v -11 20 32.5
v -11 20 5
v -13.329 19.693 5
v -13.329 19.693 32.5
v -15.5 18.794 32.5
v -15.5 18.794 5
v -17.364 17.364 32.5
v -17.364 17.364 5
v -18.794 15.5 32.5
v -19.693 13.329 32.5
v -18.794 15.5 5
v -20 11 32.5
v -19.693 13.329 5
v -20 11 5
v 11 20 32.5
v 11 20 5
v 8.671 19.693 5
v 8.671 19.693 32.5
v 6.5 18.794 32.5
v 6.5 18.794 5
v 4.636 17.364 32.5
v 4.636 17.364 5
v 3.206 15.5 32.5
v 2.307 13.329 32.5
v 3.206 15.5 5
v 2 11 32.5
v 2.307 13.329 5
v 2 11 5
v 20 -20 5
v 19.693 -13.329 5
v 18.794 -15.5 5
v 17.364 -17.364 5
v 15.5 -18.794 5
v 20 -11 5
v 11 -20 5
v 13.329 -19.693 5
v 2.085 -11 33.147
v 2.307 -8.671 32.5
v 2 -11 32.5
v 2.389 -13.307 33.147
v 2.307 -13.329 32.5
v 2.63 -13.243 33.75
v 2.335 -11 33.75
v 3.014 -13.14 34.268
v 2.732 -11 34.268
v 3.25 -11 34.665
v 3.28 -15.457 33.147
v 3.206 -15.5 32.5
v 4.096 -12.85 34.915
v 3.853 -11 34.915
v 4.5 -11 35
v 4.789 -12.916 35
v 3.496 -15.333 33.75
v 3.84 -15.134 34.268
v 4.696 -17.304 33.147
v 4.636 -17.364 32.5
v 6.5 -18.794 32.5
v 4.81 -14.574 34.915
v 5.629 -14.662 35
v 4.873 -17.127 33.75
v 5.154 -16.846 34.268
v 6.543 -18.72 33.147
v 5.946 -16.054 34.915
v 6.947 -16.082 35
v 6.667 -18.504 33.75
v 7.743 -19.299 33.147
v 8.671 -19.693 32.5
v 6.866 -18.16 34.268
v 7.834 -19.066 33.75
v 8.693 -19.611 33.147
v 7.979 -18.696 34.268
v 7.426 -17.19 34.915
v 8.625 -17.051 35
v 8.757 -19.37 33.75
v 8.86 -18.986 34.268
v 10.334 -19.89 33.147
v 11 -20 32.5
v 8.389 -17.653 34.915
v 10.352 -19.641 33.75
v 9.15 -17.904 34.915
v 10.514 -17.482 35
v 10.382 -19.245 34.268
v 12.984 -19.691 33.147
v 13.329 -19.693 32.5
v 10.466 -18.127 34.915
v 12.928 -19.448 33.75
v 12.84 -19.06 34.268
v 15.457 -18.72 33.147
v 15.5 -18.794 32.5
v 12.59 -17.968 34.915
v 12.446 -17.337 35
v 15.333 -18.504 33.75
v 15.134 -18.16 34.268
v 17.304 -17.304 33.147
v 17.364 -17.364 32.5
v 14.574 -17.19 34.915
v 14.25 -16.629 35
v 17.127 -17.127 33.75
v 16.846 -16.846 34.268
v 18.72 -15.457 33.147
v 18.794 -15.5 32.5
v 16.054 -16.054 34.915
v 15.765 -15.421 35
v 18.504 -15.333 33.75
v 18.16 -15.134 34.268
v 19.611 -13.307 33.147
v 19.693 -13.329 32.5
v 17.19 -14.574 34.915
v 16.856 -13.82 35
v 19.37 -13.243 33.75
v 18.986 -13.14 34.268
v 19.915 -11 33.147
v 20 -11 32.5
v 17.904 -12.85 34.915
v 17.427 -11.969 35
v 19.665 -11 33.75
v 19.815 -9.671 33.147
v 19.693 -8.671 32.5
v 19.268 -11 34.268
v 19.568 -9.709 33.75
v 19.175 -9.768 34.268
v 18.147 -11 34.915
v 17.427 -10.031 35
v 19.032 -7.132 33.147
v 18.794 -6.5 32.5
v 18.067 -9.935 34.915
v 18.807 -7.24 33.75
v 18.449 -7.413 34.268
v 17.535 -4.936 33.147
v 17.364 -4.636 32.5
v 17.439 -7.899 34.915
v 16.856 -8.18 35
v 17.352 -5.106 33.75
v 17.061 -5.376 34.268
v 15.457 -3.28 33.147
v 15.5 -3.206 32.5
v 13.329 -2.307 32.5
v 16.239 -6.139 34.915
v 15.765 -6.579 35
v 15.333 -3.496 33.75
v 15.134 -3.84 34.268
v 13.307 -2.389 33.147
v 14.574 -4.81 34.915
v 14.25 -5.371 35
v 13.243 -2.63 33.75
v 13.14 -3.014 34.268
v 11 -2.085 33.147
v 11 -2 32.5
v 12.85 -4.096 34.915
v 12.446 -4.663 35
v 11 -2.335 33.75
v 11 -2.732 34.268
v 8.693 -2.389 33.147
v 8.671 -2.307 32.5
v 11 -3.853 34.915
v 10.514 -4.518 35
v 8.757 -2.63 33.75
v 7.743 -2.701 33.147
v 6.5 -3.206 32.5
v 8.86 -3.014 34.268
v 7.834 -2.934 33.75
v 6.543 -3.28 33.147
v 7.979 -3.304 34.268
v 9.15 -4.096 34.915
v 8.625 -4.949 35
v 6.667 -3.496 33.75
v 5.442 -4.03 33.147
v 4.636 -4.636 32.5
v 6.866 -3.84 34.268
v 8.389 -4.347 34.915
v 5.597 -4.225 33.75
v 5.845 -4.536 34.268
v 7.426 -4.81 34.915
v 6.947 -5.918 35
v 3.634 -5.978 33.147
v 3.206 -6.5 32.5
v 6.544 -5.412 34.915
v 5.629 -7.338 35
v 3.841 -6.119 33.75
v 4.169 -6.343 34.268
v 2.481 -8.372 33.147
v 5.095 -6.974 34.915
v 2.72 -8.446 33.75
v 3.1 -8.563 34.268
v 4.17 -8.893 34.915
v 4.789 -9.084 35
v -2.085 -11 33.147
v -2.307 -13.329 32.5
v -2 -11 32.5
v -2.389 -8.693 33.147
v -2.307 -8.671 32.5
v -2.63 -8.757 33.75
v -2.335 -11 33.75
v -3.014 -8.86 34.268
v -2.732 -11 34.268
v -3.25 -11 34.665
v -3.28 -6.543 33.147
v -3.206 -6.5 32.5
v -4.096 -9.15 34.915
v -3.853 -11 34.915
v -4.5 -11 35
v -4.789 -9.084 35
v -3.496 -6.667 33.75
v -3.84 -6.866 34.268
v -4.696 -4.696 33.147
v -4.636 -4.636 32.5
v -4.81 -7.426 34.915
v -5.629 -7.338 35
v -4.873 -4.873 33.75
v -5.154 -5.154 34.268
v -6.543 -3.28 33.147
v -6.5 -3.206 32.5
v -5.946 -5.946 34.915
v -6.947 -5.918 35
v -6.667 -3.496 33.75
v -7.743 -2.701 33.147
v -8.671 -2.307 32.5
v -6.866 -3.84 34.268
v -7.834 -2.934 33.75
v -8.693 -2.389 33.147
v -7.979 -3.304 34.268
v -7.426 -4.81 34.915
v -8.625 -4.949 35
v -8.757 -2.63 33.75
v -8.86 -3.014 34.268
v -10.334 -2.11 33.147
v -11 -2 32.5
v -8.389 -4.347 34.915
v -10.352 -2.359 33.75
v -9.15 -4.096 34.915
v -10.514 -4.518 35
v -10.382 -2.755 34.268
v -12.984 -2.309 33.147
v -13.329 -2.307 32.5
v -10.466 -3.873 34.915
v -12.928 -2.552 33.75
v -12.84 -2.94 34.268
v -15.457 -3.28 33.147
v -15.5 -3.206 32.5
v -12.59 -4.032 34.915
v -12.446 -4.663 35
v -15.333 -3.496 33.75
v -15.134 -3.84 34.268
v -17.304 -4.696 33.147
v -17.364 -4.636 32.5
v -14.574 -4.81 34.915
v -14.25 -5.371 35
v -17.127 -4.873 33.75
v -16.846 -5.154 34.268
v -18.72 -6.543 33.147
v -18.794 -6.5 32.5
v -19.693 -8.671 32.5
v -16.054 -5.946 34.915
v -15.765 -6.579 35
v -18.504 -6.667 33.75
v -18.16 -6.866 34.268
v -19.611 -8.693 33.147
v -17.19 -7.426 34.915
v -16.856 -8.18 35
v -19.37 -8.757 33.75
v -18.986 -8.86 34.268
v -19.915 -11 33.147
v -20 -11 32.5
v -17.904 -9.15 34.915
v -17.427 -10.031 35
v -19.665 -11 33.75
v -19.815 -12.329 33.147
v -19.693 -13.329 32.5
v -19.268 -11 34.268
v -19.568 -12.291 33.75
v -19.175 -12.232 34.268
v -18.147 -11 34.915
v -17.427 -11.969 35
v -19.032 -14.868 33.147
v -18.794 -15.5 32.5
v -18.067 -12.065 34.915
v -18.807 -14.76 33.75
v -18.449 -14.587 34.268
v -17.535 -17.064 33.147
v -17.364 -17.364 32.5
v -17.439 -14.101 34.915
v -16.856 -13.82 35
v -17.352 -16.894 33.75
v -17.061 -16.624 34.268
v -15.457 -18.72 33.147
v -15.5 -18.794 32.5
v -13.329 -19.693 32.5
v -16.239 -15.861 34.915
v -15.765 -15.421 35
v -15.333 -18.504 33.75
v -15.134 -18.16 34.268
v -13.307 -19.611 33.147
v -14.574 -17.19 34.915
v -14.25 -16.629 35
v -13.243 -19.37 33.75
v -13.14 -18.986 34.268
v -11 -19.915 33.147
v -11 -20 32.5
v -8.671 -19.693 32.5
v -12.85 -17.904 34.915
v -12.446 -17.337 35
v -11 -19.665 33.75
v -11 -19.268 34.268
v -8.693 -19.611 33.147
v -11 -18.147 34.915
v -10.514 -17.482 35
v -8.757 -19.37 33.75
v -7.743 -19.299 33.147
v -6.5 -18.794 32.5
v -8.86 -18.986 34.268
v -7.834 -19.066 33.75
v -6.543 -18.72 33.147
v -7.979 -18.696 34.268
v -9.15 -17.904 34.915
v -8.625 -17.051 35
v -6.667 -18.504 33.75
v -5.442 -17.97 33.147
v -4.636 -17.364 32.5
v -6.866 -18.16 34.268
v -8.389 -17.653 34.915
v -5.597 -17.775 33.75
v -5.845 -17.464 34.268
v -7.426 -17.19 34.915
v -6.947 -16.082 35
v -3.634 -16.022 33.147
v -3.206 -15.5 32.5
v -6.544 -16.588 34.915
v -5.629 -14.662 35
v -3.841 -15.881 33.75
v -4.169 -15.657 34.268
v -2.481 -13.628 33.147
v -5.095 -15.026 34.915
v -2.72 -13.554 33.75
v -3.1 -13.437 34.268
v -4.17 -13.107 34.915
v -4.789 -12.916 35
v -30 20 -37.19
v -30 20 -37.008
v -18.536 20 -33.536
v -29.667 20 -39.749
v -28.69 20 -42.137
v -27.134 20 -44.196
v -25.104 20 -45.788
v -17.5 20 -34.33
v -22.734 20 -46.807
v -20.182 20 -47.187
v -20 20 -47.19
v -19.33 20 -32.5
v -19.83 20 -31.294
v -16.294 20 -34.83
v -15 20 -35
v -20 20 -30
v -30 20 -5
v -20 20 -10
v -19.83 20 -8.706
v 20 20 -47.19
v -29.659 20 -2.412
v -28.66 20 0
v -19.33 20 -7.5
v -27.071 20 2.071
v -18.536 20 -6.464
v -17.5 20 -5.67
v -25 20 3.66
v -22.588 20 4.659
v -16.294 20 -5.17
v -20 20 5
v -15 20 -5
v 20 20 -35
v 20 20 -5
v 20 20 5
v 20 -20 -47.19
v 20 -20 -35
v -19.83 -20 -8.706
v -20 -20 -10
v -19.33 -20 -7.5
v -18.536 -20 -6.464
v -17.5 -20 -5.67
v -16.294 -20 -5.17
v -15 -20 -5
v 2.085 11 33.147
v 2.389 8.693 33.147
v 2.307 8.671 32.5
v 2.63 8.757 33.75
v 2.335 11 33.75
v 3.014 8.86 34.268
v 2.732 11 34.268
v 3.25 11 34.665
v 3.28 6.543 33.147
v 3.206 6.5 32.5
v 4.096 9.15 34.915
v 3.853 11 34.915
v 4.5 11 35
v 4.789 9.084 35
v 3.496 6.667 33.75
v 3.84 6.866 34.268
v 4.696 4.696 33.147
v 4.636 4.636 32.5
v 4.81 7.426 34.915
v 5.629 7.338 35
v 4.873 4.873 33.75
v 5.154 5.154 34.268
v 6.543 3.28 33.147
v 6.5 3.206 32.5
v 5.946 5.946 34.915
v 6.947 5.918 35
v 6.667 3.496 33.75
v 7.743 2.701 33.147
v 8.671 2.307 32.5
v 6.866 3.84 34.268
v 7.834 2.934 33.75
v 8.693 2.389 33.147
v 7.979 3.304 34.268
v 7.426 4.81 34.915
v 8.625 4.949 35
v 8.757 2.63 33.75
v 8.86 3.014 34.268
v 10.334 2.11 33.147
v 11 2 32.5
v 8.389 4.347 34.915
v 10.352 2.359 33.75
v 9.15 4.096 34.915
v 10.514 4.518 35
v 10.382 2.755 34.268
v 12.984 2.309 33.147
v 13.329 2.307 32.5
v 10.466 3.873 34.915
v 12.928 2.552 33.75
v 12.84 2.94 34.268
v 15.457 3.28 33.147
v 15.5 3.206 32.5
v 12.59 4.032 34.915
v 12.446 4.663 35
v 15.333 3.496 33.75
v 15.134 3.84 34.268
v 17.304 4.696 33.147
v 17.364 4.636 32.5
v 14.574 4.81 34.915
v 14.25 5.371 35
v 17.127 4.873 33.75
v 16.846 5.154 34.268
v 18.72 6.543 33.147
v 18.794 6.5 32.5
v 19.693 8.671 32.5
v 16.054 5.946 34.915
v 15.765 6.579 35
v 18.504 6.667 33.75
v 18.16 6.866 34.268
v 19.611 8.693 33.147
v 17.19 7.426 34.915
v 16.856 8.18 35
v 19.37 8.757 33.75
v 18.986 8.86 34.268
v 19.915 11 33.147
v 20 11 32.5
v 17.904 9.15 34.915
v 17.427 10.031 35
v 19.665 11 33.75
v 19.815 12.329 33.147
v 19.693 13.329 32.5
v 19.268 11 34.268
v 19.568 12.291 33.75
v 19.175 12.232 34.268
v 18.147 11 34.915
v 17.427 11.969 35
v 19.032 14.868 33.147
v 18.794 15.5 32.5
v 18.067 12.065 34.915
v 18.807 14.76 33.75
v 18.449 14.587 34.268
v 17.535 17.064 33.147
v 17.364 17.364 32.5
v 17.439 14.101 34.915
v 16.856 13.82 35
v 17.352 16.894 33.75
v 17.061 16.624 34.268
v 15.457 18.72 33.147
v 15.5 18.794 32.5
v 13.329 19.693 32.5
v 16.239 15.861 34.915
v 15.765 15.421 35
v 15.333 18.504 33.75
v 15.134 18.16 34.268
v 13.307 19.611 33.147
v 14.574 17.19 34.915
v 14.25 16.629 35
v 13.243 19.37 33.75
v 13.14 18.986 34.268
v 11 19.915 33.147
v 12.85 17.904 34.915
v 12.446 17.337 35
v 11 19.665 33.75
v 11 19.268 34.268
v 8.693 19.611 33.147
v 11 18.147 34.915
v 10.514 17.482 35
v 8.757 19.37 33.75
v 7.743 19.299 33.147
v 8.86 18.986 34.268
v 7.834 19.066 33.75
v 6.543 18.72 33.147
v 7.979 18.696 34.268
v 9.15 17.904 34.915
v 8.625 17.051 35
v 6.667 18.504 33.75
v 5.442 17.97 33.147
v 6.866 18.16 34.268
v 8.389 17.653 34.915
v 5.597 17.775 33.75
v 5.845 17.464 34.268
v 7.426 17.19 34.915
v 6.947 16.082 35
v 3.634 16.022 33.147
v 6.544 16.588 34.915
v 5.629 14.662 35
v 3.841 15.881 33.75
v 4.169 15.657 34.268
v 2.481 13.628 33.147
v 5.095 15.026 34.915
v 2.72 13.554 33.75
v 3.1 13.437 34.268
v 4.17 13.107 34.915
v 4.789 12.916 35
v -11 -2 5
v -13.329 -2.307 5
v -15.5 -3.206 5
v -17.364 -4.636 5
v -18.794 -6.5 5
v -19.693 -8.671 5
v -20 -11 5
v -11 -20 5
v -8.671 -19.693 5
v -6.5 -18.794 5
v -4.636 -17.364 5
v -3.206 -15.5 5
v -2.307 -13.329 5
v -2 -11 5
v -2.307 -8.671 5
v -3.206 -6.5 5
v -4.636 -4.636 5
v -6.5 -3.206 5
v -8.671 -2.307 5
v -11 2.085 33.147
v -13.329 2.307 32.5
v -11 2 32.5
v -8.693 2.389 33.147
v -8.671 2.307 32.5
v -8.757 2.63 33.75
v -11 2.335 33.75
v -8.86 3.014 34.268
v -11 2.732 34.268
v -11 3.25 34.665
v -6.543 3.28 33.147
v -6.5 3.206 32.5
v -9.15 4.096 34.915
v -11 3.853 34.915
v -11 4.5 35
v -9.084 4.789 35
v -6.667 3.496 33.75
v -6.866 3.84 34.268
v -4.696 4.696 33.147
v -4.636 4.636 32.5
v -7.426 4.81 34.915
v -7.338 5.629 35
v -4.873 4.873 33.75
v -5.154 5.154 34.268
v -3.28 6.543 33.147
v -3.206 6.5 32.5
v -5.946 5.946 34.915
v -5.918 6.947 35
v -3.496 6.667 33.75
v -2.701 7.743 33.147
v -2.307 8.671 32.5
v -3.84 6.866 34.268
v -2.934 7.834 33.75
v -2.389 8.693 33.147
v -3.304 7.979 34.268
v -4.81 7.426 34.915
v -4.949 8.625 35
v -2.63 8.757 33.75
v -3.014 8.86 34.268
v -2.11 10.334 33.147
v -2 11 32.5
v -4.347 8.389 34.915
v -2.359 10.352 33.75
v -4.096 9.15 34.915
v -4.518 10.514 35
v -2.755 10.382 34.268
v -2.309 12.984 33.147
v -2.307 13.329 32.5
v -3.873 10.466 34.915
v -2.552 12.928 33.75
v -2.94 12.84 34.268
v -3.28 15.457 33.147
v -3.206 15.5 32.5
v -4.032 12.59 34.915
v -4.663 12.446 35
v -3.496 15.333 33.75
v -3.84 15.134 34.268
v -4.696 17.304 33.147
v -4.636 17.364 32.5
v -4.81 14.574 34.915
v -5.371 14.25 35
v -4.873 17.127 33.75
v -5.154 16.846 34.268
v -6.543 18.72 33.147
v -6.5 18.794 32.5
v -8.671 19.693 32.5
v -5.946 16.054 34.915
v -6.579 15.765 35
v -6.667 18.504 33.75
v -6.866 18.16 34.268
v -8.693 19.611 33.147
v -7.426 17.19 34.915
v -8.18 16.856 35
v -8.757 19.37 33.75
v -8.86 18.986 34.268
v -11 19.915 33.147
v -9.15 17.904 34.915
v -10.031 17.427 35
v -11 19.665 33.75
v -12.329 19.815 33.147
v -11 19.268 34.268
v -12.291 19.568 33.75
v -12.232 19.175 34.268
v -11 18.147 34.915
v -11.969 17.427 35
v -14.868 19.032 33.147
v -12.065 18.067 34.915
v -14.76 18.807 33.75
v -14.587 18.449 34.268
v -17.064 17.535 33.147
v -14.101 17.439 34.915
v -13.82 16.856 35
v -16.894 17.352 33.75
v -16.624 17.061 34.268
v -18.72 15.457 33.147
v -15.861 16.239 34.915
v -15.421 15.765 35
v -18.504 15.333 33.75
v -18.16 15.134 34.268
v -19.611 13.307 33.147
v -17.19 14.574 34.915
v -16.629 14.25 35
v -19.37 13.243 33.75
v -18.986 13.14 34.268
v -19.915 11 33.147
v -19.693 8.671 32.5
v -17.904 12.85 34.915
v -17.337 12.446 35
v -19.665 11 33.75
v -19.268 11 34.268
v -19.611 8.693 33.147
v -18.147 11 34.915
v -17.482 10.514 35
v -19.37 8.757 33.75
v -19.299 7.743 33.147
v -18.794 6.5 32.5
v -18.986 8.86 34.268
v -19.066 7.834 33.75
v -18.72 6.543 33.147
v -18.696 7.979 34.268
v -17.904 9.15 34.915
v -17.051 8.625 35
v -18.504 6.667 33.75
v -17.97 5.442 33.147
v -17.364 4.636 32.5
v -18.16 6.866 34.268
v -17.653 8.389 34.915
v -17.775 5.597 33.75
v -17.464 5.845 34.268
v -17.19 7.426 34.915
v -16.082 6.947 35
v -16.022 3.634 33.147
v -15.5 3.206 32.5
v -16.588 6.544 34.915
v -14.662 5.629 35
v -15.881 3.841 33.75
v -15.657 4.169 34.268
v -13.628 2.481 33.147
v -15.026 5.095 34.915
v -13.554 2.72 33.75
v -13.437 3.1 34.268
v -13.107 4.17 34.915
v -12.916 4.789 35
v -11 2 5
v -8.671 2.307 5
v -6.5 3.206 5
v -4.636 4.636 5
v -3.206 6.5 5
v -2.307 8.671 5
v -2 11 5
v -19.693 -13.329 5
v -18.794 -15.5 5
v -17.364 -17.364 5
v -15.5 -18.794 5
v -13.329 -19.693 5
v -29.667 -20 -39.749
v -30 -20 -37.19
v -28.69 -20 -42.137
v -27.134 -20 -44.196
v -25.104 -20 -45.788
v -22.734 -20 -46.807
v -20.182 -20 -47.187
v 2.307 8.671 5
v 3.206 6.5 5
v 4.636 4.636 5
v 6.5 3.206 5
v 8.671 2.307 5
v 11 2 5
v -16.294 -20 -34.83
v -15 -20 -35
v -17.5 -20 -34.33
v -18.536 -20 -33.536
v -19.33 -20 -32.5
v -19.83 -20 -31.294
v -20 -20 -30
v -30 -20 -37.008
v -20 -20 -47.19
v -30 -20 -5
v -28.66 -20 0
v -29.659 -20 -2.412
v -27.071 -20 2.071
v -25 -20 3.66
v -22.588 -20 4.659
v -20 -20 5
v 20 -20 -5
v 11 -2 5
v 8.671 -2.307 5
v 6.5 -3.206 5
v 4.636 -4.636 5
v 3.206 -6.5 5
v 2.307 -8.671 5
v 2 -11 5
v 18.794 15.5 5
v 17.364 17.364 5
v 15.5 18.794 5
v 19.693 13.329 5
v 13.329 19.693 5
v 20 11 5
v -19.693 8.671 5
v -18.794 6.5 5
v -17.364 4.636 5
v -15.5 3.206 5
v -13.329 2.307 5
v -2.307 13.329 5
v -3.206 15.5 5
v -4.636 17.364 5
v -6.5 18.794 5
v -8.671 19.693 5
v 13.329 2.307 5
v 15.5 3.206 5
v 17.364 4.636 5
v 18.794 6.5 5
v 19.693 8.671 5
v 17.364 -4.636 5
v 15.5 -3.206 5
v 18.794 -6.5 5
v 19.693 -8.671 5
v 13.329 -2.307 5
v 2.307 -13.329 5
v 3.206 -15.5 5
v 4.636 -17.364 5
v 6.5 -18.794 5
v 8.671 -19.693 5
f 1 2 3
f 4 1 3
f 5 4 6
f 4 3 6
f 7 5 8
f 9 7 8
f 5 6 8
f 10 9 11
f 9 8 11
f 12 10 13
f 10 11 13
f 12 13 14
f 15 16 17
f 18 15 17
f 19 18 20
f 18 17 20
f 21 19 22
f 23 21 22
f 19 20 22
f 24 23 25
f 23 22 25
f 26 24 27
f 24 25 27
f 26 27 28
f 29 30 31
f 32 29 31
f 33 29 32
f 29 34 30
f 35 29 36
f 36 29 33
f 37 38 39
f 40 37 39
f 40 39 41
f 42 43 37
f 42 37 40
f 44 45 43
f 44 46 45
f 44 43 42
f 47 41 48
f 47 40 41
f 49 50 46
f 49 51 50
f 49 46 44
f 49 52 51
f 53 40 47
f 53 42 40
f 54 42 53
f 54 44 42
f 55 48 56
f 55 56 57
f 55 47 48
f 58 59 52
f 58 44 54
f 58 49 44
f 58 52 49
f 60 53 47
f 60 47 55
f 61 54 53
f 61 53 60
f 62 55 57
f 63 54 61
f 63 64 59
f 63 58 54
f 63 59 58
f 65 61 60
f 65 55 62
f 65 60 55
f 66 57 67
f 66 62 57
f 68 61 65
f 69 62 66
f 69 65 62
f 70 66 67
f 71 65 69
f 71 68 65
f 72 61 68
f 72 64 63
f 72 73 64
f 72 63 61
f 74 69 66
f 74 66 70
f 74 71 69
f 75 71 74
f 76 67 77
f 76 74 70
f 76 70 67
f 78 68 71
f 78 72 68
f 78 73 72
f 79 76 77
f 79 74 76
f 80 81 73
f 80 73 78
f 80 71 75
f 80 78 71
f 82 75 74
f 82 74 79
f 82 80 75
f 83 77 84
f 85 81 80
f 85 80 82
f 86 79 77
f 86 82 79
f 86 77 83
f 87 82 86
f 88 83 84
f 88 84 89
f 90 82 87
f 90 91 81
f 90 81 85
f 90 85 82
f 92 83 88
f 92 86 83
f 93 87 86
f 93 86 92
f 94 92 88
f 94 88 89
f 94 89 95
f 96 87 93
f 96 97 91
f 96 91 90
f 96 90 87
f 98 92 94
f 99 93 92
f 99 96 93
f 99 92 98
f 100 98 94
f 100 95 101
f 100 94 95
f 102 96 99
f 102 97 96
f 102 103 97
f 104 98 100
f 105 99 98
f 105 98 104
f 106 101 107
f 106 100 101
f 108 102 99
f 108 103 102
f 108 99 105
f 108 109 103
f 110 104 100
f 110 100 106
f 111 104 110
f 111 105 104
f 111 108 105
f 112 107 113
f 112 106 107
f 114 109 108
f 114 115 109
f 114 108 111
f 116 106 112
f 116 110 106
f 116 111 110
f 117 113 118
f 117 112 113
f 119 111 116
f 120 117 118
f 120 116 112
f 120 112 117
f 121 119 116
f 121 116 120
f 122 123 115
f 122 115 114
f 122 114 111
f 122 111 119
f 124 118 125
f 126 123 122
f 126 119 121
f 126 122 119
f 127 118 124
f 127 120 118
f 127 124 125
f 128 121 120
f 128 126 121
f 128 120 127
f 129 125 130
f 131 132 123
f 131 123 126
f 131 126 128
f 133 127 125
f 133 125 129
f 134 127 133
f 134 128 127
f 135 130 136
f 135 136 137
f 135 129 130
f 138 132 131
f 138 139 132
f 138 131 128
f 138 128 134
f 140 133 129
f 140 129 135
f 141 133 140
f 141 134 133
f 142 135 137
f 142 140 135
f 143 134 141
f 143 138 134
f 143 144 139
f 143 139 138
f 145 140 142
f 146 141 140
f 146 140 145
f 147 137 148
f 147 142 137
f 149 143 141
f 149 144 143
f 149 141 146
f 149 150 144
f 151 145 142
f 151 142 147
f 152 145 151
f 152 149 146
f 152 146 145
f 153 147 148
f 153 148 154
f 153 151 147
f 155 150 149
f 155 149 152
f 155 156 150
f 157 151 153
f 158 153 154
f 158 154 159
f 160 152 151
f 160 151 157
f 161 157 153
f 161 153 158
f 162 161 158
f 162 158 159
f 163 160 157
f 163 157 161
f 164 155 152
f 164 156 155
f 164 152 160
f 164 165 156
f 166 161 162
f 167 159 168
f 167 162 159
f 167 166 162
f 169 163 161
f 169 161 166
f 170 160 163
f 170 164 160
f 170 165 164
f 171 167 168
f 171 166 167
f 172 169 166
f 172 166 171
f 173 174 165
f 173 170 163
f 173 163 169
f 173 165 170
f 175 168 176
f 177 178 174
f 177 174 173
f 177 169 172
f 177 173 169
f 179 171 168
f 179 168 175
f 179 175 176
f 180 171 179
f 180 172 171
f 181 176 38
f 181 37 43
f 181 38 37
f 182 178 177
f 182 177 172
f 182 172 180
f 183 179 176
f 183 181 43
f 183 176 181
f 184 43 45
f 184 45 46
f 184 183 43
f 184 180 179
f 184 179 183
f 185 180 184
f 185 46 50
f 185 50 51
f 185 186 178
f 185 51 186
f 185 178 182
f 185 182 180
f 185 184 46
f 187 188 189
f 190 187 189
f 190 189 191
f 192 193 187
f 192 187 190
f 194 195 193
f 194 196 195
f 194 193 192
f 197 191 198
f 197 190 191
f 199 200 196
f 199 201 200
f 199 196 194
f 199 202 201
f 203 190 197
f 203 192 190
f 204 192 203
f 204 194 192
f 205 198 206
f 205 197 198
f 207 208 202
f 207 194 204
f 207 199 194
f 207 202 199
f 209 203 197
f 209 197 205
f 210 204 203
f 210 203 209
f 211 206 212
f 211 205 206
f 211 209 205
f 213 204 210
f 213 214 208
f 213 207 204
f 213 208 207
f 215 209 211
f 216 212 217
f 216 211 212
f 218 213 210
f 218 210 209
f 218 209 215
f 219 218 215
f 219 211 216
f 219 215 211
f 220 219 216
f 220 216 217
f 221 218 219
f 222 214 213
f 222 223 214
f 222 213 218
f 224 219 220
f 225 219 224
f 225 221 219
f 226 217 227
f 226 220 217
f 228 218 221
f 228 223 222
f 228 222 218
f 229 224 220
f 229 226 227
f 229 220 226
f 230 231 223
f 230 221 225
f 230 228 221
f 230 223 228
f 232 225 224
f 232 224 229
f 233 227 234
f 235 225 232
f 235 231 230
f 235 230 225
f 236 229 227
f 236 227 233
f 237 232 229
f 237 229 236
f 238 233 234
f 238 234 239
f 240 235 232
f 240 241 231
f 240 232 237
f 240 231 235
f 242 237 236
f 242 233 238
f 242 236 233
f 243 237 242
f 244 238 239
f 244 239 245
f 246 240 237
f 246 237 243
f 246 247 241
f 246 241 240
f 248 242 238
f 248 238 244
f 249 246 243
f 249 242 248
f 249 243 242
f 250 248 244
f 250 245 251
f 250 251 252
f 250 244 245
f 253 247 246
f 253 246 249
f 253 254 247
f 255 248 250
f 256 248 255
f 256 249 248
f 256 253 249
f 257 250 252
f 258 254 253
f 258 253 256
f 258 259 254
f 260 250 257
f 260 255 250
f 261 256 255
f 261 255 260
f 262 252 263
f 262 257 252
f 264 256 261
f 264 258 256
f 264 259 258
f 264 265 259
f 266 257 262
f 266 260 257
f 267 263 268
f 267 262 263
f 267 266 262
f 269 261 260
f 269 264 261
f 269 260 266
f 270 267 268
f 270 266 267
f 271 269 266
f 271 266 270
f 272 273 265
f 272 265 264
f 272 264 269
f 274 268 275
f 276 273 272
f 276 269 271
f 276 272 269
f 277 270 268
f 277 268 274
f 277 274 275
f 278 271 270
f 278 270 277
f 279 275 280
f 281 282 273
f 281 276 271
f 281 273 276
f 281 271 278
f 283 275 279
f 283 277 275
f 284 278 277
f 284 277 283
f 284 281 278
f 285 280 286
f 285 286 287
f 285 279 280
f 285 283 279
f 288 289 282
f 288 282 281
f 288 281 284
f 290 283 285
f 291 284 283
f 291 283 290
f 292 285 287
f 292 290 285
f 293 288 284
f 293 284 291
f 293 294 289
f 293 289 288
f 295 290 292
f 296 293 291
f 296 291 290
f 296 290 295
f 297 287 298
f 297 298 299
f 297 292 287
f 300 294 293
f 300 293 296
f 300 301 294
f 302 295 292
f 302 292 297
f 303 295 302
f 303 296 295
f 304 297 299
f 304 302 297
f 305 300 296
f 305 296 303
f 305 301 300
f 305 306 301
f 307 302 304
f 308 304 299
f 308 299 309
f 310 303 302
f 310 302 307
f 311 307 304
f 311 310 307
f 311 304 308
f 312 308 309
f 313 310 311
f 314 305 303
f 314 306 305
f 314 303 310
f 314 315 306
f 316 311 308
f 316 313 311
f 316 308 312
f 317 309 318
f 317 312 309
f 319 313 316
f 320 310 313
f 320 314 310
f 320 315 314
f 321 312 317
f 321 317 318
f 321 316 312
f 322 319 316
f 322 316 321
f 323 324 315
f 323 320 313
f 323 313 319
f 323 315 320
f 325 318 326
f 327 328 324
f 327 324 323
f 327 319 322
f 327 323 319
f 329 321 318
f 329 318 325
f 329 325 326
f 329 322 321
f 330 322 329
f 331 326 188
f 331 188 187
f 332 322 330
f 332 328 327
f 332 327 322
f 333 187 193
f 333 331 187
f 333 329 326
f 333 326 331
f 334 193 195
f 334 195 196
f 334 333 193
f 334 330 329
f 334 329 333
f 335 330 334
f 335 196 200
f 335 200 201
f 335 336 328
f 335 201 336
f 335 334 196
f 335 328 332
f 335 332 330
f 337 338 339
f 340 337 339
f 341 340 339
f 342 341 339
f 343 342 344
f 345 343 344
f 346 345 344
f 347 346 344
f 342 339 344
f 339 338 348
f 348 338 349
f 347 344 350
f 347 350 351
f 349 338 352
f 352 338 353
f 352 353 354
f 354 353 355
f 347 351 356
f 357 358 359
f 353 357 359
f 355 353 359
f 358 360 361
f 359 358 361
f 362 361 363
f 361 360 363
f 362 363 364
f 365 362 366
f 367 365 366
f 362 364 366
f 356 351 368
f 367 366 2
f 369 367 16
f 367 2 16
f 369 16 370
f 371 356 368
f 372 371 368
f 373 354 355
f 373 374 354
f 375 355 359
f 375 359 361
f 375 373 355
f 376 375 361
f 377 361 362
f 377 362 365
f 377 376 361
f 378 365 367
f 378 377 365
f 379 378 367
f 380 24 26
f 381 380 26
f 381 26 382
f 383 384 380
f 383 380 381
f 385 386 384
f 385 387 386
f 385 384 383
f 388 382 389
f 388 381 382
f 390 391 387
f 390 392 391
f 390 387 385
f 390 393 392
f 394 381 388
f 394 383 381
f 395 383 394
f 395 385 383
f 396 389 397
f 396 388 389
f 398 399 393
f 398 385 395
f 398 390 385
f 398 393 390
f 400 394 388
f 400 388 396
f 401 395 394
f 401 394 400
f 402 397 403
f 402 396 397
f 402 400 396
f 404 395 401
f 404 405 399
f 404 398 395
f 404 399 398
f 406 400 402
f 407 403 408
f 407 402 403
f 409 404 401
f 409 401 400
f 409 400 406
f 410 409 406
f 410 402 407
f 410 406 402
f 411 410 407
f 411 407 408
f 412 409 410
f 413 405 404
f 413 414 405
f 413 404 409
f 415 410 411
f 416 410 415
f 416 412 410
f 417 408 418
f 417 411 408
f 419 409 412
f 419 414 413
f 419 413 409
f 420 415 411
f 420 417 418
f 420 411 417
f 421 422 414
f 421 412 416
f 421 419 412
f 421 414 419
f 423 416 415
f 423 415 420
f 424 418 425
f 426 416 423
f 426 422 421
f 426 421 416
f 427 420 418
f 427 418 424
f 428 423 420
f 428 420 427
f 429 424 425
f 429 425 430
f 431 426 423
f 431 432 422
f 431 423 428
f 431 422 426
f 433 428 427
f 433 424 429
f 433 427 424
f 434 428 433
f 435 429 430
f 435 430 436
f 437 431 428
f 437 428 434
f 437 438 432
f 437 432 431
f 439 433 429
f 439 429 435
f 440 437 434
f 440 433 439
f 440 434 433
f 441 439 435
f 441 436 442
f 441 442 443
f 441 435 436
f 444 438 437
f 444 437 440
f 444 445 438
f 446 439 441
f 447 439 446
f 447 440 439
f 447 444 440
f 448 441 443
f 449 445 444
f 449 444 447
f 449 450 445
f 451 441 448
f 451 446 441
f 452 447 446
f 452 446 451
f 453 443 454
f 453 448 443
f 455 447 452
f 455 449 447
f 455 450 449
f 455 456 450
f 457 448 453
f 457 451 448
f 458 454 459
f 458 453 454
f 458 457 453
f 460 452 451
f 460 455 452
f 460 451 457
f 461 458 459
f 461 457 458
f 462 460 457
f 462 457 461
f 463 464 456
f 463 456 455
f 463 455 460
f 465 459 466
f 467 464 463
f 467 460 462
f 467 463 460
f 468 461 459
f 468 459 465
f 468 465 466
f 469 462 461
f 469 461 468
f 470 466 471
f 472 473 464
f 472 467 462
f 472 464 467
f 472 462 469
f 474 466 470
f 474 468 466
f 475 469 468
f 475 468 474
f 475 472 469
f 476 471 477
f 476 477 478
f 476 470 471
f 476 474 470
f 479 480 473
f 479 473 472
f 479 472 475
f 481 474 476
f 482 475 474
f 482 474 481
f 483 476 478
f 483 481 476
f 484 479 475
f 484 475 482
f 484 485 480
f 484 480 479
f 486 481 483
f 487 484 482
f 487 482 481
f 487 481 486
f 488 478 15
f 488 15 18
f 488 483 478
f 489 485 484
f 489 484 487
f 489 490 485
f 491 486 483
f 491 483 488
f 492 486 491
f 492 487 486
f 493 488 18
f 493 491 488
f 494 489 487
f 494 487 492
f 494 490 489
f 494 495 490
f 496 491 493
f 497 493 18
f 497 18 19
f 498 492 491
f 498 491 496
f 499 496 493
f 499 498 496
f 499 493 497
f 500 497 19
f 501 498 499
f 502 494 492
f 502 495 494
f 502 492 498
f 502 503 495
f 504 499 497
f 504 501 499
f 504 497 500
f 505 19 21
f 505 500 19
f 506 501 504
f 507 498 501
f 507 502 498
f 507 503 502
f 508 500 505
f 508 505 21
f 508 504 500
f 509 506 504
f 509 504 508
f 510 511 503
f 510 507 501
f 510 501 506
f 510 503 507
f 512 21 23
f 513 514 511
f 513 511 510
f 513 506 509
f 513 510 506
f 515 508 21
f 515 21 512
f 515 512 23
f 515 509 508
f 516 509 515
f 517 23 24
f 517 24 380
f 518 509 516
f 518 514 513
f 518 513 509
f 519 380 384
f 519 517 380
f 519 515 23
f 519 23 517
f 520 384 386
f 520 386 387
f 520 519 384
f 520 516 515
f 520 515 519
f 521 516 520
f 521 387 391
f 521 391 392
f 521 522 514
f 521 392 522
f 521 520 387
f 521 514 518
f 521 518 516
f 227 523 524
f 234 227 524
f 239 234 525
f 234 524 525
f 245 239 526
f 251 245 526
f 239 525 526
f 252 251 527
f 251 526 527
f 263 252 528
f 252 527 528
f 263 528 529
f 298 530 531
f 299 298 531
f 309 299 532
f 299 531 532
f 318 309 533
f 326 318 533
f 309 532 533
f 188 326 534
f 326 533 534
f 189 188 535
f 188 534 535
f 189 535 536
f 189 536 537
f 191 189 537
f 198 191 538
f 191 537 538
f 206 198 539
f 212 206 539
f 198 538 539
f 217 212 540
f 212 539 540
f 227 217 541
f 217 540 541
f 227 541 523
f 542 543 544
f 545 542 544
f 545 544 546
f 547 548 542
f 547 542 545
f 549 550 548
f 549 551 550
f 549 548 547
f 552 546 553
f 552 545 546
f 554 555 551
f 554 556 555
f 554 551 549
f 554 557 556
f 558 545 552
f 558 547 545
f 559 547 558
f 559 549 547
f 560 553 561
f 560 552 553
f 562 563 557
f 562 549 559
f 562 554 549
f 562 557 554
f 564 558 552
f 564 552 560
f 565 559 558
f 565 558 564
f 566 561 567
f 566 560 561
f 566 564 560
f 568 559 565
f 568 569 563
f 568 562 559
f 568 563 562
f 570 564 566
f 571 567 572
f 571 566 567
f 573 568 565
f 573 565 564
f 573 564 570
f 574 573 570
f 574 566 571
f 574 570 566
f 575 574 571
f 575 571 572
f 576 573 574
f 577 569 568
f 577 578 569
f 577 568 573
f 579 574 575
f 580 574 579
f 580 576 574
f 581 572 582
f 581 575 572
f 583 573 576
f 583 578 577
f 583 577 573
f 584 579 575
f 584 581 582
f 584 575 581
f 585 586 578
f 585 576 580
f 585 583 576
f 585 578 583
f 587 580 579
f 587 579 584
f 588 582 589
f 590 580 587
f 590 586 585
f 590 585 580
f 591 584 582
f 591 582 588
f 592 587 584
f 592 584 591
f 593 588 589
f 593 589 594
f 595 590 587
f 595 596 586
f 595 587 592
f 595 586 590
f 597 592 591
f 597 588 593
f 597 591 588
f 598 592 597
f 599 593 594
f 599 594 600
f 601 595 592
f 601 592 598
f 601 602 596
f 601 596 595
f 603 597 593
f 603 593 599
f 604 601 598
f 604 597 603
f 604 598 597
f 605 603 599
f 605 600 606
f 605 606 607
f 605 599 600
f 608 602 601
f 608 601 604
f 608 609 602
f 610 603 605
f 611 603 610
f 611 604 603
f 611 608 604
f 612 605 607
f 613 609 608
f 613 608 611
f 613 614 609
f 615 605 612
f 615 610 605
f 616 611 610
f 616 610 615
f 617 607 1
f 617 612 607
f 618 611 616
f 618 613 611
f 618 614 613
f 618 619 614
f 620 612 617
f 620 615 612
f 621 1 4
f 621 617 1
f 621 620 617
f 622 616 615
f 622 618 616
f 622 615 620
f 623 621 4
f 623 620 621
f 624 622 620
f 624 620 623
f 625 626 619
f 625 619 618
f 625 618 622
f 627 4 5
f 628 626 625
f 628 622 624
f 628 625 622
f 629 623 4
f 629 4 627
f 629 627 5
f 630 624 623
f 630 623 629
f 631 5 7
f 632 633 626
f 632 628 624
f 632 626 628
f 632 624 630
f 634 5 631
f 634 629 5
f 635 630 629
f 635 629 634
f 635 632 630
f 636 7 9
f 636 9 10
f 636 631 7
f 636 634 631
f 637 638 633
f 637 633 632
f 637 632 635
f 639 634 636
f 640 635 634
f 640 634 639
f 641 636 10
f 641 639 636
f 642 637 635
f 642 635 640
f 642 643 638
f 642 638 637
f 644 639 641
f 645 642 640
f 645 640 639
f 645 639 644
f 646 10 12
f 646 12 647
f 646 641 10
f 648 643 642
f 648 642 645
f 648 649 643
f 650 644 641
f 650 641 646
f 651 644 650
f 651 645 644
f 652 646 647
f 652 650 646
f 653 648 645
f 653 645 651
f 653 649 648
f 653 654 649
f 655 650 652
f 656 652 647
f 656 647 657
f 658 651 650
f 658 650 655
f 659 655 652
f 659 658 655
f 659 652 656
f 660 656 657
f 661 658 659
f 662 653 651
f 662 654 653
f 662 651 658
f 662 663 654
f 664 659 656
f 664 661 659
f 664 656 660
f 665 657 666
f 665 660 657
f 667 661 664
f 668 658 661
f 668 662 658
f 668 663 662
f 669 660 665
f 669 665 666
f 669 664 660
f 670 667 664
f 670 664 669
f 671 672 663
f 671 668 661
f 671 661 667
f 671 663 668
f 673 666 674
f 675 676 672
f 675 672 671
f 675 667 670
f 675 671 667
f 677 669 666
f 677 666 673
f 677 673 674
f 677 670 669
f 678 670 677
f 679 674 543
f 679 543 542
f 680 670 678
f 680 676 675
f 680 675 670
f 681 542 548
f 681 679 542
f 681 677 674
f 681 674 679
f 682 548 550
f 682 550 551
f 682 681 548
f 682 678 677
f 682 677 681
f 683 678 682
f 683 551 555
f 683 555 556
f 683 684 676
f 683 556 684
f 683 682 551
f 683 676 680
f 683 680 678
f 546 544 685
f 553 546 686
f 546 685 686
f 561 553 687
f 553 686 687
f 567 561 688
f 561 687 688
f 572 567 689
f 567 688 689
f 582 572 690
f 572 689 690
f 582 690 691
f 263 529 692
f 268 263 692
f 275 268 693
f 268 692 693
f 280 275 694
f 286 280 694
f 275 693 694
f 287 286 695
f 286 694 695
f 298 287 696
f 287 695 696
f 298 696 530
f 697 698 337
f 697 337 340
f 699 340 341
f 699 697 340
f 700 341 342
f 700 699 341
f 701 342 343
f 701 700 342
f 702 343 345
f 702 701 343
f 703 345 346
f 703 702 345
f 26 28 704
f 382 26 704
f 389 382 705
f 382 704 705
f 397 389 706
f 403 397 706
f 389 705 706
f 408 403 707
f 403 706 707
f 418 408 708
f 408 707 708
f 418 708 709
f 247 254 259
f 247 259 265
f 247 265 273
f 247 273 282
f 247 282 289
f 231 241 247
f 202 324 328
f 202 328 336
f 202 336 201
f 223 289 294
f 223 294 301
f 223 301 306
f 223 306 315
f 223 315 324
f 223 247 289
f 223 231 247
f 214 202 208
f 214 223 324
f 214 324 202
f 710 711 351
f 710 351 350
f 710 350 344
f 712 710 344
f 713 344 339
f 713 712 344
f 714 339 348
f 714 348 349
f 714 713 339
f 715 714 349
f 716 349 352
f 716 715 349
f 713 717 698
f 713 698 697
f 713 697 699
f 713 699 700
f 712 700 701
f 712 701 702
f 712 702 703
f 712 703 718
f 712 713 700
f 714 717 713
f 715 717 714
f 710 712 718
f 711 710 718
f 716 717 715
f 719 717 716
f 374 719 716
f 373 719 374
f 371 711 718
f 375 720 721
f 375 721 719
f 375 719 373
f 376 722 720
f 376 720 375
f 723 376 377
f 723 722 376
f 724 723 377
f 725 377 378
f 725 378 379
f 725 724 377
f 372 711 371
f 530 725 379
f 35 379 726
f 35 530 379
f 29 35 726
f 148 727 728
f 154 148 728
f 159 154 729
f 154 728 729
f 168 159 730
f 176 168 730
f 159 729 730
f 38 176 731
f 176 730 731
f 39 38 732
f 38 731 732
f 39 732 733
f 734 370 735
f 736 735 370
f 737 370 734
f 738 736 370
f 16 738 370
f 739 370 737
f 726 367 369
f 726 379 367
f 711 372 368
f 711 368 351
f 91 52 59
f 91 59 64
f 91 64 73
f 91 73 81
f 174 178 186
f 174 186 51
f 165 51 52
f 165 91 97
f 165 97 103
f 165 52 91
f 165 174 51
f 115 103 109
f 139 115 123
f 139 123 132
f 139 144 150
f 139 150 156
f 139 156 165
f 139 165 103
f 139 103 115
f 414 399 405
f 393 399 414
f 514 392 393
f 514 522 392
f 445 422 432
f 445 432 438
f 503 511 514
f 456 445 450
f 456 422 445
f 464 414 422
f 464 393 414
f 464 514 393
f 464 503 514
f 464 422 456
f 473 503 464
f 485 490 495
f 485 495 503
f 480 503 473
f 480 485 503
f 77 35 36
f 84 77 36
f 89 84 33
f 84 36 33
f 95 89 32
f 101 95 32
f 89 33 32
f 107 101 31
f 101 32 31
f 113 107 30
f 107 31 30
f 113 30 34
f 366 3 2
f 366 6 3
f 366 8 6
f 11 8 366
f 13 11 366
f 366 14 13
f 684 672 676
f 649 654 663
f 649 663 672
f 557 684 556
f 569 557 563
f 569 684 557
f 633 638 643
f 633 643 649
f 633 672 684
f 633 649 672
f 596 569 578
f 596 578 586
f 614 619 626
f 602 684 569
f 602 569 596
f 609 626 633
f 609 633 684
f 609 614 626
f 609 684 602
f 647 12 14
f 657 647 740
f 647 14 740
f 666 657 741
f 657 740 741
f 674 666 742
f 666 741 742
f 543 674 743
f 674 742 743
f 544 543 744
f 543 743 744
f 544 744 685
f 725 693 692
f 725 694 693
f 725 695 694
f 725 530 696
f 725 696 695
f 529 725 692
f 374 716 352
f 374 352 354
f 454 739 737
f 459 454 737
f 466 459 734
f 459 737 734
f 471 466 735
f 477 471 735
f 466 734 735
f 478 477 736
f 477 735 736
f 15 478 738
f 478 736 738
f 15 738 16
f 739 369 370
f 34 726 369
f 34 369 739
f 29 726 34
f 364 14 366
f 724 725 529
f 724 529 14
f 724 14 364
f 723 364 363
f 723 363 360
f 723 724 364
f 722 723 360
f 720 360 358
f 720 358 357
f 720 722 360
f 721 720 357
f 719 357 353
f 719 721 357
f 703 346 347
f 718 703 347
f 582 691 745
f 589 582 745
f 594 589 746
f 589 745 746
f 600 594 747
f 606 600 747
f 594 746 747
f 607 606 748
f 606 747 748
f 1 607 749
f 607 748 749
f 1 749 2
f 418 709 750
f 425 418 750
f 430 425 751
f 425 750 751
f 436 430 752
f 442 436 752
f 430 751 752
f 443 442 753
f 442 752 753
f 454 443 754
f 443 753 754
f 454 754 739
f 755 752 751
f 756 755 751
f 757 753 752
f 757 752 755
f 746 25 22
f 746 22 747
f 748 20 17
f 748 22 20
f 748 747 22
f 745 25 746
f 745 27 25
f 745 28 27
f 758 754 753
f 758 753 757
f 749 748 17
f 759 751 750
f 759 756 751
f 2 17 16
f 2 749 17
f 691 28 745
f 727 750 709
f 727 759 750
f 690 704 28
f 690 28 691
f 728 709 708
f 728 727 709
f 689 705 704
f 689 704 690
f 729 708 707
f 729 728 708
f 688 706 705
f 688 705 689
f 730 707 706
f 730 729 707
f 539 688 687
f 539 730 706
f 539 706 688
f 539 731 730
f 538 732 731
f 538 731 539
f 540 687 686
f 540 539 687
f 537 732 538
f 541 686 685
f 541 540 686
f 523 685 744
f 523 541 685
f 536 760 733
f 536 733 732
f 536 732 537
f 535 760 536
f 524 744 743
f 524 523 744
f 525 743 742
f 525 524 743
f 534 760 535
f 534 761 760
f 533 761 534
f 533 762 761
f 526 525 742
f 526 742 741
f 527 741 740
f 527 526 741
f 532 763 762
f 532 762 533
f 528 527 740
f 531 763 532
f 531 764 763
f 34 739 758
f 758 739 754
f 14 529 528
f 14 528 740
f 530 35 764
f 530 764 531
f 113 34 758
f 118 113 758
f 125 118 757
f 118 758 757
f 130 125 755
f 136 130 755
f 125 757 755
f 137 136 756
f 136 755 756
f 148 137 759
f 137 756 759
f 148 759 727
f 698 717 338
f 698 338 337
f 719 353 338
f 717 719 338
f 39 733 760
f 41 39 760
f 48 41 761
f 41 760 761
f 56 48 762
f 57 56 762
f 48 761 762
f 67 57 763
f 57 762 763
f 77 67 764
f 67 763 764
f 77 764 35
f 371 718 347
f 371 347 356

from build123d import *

# Parameters (mm, degrees)
F1_DEPTH = 20
F3_DEPTH = 30


# Not quite as in the source:
# - a fillet or chamfer that OpenCascade refuses, or shapes differently, is made with other operations: its cross-section is extruded or revolved along the edge and cut away or added
# - a feature names something its author has since deleted; it is built from what else it names


with BuildPart() as f1:
    # F0 (on Front) → F1 (new body, symmetric)
    with BuildSketch(Plane.XZ):
        with BuildLine():
            Line((-10, -5), (20, -5))
            Line((20, -5), (20, 5))
            Line((20, 5), (-20, 5))
            ThreePointArc((-20, 5), (-27.0710678119, 2.0710678119), (-30, -5))
            Line((-30, -5), (-30, -37.0084848255))
            Line((-30, -37.0084848255), (-29.9999700785, -37.1900333921))
            ThreePointArc((-29.9999700785, -37.1900333921), (-27.134358967, -44.1955599538), (-20.1815186475, -47.1867371371))
            Line((-20.1815186475, -47.1867371371), (-20, -47.1900331229))
            Line((-20, -47.1900331229), (20, -47.1900331229))
            Line((20, -47.1900331229), (20, -35))
            Line((20, -35), (-15, -35))
            ThreePointArc((-15, -35), (-18.5355339059, -33.5355339059), (-20, -30))
            Line((-20, -30), (-20, -15))
            Line((-20, -15), (-20, -10))
            ThreePointArc((-20, -10), (-18.5355339059, -6.4644660941), (-15, -5))
            Line((-15, -5), (-10, -5))
        make_face()
    extrude(amount=F1_DEPTH, both=True)

    # F2 (on face) → F3 (join)
    with BuildSketch(Plane.XY.offset(5)):
        with BuildLine():
            Line((-11, 11), (-2, 11))
            ThreePointArc((-2, 11), (-4.6360389693, 17.3639610307), (-11, 20))
            Line((-11, 20), (-11, 11))
        make_face()
        with BuildLine():
            Line((-20, 11), (-11, 11))
            Line((-11, 11), (-11, 20))
            ThreePointArc((-11, 20), (-17.3639610307, 17.3639610307), (-20, 11))
        make_face()
        with BuildLine():
            ThreePointArc((-20, 11), (-17.3639610288, 4.6360389675), (-10.9999999948, 2))
            Line((-11, 2), (-11, 11))
            Line((-11, 11), (-20, 11))
        make_face()
        with BuildLine():
            Line((-11, 11), (-11, 2))
            ThreePointArc((-10.9999999948, 2), (-4.6360389675, 4.6360389712), (-2, 11))
            Line((-2, 11), (-11, 11))
        make_face()
        with BuildLine():
            ThreePointArc((11, 20), (4.6360389693, 17.3639610307), (2, 11))
            Line((2, 11), (11, 11))
            Line((11, 11), (11, 20))
        make_face()
        with BuildLine():
            Line((11, 20), (11, 11))
            Line((11, 11), (20, 11))
            ThreePointArc((20, 11), (17.3639610307, 17.3639610307), (11, 20))
        make_face()
        with BuildLine():
            Line((11, 11), (11, 2))
            ThreePointArc((11, 2), (17.3639610307, 4.6360389693), (20, 11))
            Line((20, 11), (11, 11))
        make_face()
        with BuildLine():
            ThreePointArc((2, 11), (4.6360389693, 4.6360389693), (11, 2))
            Line((11, 2), (11, 11))
            Line((11, 11), (2, 11))
        make_face()
        with BuildLine():
            ThreePointArc((11, -2), (4.6360389693, -4.6360389693), (2, -11))
            Line((2, -11), (11, -11))
            Line((11, -11), (11, -2))
        make_face()
        with BuildLine():
            Line((11, -2), (11, -11))
            Line((11, -11), (20, -11))
            ThreePointArc((20, -11), (17.3639610307, -4.6360389693), (11, -2))
        make_face()
        with BuildLine():
            Line((11, -11), (11, -20))
            ThreePointArc((11, -20), (17.3639610307, -17.3639610307), (20, -11))
            Line((20, -11), (11, -11))
        make_face()
        with BuildLine():
            Line((11, -11), (2, -11))
            ThreePointArc((2, -11), (4.6360389693, -17.3639610307), (11, -20))
            Line((11, -20), (11, -11))
        make_face()
        with BuildLine():
            ThreePointArc((-11, -20), (-4.6360389693, -17.3639610307), (-2, -11))
            Line((-2, -11), (-11, -11))
            Line((-11, -11), (-11, -20))
        make_face()
        with BuildLine():
            ThreePointArc((-20, -11), (-17.3639610307, -17.3639610307), (-11, -20))
            Line((-11, -20), (-11, -11))
            Line((-11, -11), (-20, -11))
        make_face()
        with BuildLine():
            Line((-20, -11), (-11, -11))
            Line((-11, -11), (-11, -2))
            ThreePointArc((-11, -2), (-17.3639610307, -4.6360389693), (-20, -11))
        make_face()
        with BuildLine():
            Line((-11, -11), (-2, -11))
            ThreePointArc((-2, -11), (-4.6360389693, -4.6360389693), (-11, -2))
            Line((-11, -2), (-11, -11))
        make_face()
    extrude(amount=F3_DEPTH)

    # F4: fillet of radius 2.5 on 4 edges, made by hand

    # F4_s1 → F4_t2 (revolve, cut)
    with BuildSketch(Plane.YZ.offset(-11)):
        with BuildLine():
            ThreePointArc((2, 32.5), (2.732233047, 34.267766953), (4.5, 35))
            Line((4.5, 35), (2, 35))
            Line((2, 35), (2, 32.5))
        make_face()
    revolve(axis=Axis((-11, 11, 35), (0, 0, 1)), mode=Mode.SUBTRACT)

    # F4_s3 → F4_t4 (revolve, cut)
    with BuildSketch(Plane.XZ.offset(-11)):
        with BuildLine():
            ThreePointArc((2, 32.5), (2.732233047, 34.267766953), (4.5, 35))
            Line((4.5, 35), (2, 35))
            Line((2, 35), (2, 32.5))
        make_face()
    revolve(axis=Axis((11, 11, 35), (0, 0, 1)), mode=Mode.SUBTRACT)

    # F4_s5 → F4_t6 (revolve, cut)
    with BuildSketch(Plane.XZ.offset(11)):
        with BuildLine():
            ThreePointArc((2, 32.5), (2.732233047, 34.267766953), (4.5, 35))
            Line((4.5, 35), (2, 35))
            Line((2, 35), (2, 32.5))
        make_face()
    revolve(axis=Axis((11, -11, 35), (0, 0, 1)), mode=Mode.SUBTRACT)

    # F4_s7 → F4_t8 (revolve, cut)
    with BuildSketch(Plane.XZ.offset(11)):
        with BuildLine():
            ThreePointArc((-2, 32.5), (-2.732233047, 34.267766953), (-4.5, 35))
            Line((-4.5, 35), (-2, 35))
            Line((-2, 35), (-2, 32.5))
        make_face()
    revolve(axis=Axis((-11, -11, 35), (0, 0, 1)), mode=Mode.SUBTRACT)


solid = f1.part
